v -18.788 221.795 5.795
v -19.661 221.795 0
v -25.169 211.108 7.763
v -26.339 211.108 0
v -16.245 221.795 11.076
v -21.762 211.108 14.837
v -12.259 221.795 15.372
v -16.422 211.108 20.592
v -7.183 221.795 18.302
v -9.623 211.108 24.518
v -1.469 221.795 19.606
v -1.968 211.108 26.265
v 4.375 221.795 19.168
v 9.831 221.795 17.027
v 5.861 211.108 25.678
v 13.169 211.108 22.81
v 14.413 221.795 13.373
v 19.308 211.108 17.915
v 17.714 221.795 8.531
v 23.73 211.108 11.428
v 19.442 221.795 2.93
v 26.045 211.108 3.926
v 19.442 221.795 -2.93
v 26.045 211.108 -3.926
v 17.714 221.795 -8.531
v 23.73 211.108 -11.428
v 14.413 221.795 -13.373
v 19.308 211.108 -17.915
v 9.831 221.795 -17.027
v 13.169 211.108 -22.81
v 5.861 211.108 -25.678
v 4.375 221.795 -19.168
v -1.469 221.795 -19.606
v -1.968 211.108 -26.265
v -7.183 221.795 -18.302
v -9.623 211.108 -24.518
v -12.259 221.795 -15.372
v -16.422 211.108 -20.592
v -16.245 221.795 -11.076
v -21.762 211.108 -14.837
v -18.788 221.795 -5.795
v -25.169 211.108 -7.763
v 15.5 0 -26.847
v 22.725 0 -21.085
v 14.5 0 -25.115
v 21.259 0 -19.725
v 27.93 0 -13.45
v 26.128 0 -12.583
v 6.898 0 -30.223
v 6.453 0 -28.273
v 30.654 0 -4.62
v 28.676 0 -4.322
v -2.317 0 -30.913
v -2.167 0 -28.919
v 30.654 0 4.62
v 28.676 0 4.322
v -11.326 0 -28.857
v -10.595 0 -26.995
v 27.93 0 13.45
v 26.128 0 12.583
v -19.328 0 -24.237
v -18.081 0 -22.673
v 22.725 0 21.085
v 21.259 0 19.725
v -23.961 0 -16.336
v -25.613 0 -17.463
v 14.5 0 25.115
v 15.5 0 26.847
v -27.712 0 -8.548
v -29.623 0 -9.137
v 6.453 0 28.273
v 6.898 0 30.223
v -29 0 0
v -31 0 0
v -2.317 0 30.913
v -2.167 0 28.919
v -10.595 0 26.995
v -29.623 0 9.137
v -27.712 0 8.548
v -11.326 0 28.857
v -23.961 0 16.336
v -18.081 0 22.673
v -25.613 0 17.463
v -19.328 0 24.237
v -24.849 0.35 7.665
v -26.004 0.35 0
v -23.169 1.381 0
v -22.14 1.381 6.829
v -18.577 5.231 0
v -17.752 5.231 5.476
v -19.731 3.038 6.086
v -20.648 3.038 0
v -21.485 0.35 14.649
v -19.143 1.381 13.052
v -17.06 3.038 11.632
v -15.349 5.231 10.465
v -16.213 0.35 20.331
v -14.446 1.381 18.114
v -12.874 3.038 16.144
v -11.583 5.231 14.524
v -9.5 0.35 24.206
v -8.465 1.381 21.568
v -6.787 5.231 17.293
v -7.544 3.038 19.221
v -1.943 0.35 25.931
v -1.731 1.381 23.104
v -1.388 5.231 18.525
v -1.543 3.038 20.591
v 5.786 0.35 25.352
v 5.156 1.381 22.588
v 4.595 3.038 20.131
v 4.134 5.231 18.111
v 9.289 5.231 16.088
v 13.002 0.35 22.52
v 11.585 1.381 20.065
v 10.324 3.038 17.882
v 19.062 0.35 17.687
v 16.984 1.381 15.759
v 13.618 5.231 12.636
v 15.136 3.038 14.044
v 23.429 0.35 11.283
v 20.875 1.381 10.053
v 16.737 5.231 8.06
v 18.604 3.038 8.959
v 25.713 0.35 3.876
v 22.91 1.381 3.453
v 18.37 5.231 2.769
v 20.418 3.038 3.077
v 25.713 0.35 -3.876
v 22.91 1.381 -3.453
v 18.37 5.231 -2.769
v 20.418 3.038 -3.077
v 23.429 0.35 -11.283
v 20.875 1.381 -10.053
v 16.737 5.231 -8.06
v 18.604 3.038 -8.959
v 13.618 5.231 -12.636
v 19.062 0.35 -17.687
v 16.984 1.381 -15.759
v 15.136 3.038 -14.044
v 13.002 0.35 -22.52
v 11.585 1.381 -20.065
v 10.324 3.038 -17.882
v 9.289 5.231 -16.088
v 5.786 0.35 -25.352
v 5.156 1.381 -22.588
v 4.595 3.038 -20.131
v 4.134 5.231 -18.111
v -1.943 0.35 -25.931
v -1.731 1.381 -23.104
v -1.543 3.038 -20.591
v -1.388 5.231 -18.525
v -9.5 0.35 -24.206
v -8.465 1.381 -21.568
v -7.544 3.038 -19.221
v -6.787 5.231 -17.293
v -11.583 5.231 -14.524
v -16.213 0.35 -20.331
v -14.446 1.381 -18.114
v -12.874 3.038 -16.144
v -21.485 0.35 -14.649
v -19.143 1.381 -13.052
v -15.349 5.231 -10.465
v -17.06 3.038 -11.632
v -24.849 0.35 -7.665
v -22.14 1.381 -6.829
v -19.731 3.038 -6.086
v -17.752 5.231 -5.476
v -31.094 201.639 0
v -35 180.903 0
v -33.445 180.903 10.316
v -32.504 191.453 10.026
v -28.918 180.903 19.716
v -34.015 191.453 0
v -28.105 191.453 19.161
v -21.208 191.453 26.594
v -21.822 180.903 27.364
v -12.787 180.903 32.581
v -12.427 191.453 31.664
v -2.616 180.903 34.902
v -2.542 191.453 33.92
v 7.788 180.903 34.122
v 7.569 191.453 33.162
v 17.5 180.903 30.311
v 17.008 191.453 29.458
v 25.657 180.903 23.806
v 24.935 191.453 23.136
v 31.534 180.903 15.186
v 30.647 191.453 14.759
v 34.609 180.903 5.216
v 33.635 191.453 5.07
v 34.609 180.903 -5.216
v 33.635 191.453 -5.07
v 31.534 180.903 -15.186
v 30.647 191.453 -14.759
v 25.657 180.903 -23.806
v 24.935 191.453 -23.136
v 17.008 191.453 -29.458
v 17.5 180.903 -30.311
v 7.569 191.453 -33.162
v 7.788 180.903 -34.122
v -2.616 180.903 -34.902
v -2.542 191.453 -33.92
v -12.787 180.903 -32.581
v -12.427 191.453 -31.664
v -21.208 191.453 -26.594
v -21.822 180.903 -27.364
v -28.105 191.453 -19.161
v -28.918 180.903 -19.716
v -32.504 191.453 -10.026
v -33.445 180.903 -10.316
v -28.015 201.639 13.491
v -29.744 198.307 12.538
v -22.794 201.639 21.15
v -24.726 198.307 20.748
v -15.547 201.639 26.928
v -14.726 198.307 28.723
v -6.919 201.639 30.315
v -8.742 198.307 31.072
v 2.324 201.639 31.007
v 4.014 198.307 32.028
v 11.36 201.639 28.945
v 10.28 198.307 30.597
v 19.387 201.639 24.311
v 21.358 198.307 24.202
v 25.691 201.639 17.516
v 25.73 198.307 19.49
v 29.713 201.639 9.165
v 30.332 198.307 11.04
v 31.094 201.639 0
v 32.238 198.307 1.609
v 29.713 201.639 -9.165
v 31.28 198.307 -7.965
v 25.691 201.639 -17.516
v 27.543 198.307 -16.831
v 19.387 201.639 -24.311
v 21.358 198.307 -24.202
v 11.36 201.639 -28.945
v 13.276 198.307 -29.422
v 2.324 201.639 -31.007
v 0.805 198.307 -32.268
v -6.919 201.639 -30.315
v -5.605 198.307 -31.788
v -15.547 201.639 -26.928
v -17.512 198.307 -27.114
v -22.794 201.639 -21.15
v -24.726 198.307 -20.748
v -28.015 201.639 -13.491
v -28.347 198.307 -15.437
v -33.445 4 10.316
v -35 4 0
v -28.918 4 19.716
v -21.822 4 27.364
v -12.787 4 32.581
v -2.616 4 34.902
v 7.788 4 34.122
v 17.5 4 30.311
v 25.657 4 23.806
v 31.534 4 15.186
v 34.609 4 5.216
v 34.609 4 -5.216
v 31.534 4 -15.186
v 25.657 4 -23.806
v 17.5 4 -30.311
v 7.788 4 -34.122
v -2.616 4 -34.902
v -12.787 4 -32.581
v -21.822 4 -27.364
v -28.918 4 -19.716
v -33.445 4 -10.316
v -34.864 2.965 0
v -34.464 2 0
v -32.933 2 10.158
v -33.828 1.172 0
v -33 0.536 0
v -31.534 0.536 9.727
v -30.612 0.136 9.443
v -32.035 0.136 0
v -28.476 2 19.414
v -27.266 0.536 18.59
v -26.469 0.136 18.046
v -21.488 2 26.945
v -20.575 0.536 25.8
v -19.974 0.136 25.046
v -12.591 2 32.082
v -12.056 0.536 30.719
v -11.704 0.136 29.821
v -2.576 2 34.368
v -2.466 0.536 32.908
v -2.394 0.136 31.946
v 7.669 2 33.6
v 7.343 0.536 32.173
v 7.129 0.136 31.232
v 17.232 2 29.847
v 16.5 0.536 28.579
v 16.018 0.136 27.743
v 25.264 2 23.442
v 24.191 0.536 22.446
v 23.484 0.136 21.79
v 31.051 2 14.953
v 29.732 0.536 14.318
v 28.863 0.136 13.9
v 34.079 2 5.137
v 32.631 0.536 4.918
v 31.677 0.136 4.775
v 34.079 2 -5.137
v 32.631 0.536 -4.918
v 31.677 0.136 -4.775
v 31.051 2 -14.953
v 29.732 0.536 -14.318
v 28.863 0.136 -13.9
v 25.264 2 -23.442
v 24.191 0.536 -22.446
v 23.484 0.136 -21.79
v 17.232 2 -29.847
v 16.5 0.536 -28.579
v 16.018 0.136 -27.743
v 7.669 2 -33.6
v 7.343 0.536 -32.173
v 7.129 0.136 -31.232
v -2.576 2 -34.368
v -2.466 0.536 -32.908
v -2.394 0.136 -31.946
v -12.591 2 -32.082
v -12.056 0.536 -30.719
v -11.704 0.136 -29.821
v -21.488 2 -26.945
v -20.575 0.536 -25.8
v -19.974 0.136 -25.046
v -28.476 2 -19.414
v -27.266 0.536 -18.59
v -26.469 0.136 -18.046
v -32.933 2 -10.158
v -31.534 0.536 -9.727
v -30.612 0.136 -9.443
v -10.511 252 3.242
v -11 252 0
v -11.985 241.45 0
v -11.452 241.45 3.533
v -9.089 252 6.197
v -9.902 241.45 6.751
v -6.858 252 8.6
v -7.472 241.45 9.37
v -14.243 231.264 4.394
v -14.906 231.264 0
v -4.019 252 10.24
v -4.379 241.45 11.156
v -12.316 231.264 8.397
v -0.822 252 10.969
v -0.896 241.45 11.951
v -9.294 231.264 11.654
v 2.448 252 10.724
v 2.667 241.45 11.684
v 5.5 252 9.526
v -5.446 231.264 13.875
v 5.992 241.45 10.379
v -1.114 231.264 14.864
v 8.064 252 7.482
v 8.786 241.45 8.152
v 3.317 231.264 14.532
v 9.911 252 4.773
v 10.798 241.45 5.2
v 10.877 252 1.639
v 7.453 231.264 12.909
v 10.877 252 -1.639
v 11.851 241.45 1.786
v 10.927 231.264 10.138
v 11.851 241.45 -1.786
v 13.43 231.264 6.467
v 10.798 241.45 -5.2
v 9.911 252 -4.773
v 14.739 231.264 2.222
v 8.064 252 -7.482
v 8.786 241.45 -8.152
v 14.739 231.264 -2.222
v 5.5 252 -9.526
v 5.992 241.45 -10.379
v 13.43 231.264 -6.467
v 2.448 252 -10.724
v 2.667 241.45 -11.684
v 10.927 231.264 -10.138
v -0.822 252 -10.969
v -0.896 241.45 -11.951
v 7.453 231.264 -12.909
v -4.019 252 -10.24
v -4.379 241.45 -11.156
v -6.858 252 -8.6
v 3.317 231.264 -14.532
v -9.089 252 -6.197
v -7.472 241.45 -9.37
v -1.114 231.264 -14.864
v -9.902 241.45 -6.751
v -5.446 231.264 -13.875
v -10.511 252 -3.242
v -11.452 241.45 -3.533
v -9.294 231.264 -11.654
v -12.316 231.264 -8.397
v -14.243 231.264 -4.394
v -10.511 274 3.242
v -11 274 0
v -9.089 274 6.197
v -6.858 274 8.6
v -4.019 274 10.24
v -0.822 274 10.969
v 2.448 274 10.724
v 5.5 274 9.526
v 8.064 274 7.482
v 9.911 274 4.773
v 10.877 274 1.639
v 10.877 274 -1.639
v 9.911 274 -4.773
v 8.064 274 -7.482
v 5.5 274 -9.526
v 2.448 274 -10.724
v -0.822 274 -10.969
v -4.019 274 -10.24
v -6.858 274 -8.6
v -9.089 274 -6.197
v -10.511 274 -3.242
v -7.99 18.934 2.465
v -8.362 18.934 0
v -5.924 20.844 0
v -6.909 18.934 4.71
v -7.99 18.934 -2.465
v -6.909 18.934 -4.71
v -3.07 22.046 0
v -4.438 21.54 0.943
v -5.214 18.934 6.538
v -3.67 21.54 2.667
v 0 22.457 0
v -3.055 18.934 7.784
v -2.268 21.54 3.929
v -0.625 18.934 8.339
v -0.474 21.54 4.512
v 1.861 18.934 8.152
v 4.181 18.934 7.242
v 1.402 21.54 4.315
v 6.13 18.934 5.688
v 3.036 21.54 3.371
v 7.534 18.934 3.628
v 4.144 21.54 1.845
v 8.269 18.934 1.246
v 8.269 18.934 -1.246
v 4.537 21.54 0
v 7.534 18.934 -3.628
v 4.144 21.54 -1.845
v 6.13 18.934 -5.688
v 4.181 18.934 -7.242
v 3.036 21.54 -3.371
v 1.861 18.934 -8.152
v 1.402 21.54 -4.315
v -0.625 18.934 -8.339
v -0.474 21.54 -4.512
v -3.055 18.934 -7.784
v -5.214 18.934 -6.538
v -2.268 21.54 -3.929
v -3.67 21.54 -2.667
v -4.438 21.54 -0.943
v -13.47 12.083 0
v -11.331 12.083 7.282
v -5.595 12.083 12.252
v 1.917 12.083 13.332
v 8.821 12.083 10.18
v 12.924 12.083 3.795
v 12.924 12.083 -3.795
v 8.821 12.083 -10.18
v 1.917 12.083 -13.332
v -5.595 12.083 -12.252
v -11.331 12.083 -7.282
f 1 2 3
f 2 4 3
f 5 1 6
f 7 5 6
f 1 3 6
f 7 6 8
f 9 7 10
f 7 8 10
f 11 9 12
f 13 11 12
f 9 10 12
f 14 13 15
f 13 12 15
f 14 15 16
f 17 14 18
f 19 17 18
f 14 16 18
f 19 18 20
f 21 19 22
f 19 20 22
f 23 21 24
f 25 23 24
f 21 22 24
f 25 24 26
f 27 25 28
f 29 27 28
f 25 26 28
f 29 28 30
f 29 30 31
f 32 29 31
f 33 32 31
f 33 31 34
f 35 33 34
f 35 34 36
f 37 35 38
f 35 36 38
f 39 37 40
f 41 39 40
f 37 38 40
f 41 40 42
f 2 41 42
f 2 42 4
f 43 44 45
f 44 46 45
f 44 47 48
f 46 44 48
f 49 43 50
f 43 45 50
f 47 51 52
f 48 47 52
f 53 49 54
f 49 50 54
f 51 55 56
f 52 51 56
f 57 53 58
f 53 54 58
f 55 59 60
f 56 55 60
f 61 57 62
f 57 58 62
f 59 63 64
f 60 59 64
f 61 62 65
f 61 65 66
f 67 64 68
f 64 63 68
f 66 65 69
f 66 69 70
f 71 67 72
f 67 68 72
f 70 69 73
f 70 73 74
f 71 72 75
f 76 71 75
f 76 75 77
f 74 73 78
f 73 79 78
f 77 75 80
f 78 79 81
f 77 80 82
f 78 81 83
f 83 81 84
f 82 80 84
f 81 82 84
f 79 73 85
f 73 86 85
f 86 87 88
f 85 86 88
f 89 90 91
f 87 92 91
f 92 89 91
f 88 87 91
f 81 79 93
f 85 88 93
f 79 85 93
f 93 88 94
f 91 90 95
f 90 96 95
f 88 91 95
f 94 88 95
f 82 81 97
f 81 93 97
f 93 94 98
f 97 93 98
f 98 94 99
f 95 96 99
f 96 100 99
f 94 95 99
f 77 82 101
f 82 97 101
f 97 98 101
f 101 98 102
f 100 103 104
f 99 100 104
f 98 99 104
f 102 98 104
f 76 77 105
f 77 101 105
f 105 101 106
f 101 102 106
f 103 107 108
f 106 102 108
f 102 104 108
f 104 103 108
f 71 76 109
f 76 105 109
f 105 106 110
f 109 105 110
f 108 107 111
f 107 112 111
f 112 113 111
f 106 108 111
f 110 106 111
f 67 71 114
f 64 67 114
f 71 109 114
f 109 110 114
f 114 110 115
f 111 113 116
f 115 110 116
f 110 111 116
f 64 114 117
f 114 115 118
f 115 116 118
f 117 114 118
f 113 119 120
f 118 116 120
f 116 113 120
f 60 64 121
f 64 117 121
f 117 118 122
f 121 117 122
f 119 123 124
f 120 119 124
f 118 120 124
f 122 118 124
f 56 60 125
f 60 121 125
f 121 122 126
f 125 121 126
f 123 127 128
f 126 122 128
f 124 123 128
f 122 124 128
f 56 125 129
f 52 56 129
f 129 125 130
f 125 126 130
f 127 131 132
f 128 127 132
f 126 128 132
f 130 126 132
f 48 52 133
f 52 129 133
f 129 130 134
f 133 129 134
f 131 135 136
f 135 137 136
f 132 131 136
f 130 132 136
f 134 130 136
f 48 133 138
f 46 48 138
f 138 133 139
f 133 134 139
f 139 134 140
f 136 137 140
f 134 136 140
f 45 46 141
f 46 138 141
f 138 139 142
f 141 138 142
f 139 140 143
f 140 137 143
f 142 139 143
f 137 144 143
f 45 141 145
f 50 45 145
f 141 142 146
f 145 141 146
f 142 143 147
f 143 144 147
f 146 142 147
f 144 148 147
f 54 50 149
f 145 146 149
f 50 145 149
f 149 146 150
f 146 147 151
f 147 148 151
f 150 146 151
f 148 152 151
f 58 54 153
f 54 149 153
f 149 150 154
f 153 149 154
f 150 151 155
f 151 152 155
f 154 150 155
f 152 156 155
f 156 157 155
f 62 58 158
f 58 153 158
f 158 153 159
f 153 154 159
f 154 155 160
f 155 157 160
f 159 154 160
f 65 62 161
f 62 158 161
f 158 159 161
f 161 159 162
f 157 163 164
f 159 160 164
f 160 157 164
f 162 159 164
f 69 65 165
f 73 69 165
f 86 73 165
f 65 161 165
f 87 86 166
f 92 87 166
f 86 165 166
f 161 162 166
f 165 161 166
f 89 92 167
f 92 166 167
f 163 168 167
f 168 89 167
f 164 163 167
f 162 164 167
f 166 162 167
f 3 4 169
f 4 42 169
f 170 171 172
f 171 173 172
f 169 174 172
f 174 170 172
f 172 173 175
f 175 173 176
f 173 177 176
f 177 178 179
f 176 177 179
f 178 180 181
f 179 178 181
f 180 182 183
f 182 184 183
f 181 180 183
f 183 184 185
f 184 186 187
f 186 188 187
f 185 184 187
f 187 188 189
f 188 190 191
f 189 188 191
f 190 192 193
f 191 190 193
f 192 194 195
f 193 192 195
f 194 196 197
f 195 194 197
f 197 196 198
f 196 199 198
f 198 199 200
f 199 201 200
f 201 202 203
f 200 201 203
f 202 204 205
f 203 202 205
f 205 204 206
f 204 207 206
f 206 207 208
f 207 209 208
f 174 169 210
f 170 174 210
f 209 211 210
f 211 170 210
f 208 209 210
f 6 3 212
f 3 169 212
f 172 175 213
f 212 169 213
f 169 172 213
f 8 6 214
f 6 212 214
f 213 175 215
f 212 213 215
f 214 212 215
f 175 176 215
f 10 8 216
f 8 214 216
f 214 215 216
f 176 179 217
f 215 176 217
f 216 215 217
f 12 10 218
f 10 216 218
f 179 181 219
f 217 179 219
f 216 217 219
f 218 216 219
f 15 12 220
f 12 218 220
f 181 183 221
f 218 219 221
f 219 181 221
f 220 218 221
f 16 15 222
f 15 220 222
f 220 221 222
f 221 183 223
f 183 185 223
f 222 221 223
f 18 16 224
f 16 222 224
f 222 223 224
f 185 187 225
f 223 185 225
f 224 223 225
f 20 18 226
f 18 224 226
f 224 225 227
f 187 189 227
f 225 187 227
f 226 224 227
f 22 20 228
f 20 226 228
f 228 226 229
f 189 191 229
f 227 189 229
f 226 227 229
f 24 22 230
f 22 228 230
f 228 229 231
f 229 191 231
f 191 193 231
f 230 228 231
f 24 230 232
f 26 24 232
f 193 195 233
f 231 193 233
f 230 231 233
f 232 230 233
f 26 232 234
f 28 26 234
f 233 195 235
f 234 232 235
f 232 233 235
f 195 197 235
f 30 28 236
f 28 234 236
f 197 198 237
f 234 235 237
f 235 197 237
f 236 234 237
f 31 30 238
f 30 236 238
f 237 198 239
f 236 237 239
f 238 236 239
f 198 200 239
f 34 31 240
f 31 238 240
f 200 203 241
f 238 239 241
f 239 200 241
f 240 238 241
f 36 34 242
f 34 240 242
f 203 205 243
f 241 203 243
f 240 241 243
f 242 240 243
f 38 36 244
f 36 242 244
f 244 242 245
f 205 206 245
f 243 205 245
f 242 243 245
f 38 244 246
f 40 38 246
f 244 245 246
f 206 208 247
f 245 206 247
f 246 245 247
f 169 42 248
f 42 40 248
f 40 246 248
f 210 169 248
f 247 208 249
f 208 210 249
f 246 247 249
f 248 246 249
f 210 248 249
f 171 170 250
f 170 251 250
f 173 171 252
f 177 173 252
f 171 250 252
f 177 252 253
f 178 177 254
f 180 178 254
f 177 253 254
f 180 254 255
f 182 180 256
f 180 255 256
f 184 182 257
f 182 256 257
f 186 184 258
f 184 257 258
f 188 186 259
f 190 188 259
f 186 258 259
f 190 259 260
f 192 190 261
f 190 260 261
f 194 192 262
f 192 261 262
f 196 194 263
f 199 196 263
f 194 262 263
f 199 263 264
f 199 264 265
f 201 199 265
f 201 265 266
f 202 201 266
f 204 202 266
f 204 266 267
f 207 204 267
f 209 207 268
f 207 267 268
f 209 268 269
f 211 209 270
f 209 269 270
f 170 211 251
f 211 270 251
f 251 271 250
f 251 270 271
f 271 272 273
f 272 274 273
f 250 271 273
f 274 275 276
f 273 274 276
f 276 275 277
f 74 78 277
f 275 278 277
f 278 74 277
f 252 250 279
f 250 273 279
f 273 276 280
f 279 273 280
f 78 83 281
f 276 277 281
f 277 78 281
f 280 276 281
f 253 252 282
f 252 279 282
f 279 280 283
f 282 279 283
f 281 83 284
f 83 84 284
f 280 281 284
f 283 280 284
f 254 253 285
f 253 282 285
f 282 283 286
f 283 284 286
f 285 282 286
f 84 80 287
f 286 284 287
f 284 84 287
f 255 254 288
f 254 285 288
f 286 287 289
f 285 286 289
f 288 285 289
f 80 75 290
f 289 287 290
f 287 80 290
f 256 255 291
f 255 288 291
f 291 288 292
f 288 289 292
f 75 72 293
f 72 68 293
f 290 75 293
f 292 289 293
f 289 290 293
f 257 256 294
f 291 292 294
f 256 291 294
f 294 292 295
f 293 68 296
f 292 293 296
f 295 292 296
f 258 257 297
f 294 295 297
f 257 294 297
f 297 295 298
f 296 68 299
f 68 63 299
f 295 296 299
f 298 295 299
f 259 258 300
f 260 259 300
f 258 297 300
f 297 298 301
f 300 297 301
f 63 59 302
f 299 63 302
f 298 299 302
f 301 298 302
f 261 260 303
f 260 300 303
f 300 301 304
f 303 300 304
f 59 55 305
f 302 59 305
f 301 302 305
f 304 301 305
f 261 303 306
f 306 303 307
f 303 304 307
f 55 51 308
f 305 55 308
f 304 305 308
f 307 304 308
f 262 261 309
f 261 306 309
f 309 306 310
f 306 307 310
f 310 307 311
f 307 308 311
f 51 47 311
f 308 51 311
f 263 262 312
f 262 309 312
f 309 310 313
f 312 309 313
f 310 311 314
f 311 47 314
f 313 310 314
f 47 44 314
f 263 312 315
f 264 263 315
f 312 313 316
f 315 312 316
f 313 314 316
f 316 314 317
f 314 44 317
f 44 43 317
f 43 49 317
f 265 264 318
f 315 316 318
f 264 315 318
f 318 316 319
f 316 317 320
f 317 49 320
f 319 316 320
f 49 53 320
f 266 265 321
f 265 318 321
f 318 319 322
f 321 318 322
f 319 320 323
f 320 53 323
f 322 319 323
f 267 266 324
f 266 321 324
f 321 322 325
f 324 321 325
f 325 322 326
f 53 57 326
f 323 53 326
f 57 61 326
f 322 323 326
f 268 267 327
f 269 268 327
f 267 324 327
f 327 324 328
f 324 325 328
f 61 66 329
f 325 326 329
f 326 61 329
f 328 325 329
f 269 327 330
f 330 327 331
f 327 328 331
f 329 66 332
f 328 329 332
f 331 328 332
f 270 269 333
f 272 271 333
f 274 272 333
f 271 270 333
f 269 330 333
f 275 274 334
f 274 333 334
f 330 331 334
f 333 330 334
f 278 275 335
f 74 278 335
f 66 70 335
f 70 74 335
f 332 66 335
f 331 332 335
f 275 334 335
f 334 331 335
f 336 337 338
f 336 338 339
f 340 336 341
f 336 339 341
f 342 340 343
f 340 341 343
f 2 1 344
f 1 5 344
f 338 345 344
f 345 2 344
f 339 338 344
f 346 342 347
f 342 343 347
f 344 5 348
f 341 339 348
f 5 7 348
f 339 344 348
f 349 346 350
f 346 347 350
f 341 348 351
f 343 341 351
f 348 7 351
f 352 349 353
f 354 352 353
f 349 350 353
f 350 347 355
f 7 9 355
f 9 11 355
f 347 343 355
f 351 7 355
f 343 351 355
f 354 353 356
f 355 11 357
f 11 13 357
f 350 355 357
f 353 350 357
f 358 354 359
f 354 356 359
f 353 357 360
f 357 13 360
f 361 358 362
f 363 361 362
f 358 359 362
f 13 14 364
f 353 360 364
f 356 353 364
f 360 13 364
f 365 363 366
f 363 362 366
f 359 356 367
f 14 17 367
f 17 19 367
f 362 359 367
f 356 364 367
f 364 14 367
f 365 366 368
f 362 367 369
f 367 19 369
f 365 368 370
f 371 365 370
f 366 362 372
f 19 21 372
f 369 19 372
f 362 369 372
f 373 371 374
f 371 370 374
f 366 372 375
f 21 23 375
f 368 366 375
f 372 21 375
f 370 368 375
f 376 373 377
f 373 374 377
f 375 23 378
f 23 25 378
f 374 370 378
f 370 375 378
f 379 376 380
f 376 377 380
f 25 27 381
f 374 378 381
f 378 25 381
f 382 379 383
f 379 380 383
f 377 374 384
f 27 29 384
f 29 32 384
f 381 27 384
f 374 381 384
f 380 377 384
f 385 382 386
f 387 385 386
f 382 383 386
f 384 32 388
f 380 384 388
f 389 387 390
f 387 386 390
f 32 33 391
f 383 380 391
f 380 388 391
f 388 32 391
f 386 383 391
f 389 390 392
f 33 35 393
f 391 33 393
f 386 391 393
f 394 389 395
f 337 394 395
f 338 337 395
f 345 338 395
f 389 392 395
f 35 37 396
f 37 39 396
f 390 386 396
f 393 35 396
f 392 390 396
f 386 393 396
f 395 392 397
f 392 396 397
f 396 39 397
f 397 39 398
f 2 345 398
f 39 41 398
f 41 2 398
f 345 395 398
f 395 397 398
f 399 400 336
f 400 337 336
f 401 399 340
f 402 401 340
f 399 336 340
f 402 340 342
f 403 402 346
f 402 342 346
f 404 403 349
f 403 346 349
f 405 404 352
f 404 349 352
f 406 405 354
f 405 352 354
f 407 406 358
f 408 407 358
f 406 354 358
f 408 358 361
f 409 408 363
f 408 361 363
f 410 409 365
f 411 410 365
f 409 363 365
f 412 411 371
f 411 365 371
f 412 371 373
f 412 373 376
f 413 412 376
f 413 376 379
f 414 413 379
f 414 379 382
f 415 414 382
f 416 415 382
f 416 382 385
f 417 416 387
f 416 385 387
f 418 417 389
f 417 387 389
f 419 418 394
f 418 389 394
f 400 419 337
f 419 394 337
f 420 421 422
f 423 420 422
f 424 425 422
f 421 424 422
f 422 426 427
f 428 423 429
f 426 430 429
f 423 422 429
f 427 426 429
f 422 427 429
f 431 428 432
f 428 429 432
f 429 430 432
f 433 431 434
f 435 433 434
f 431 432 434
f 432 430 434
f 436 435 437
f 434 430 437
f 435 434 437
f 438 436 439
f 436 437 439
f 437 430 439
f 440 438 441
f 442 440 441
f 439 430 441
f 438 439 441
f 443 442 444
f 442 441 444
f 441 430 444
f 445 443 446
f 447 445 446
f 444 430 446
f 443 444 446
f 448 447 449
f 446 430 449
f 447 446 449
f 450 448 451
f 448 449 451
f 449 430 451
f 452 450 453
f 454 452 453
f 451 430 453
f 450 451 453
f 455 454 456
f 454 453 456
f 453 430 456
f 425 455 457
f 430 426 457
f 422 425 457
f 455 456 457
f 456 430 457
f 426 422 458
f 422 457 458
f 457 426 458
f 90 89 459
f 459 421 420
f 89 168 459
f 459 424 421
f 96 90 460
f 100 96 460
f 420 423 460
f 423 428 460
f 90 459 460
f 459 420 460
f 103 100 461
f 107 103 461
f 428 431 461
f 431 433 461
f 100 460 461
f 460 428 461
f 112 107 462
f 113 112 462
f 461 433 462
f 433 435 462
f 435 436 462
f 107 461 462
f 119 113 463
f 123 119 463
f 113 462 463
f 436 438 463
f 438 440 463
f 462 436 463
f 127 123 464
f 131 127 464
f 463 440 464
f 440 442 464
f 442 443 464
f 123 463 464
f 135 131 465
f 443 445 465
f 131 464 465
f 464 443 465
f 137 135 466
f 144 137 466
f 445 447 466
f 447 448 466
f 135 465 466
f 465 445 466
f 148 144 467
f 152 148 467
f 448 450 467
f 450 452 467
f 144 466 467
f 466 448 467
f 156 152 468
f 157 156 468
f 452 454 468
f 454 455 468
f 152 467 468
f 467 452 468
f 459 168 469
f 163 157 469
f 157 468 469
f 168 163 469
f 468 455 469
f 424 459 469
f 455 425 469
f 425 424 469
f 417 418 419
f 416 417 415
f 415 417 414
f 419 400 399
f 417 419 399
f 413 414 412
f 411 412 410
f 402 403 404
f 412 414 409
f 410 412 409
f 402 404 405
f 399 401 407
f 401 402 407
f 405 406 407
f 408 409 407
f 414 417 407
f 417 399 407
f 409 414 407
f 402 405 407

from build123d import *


with BuildPart() as part:
    # Sketch2 → Revolve1 (revolve)
    with BuildSketch(Plane.XY):
        with BuildLine():
            Line((0, 274), (-11, 274))
            Line((-11, 274), (-11, 252))
            ThreePointArc((-11, 252), (-13.208083332, 236.288670718), (-19.661258519, 221.794601939))
            Line((-19.661258519, 221.794601939), (-26.338741481, 211.108395388))
            ThreePointArc((-26.338741481, 211.108395388), (-32.791916668, 196.614326608), (-35, 180.902997327))
            Line((-35, 180.902997327), (-35, 4))
            ThreePointArc((-35, 4), (-33.828427125, 1.171572875), (-31, 0))
            Line((-31, 0), (-29, 0))
            ThreePointArc((-29, 0), (-23.169165423, 1.380991086), (-18.577150935, 5.230558749))
            Line((-18.577150935, 5.230558749), (-8.361917252, 18.934483574))
            ThreePointArc((-8.361917252, 18.934483574), (-4.536719094, 21.540170522), (0, 22.456644901))
            Line((0, 22.456644901), (0, 274))
        make_face()
    revolve(axis=Axis((0, 0, 0), (0, 1, 0)))


solid = part.part
